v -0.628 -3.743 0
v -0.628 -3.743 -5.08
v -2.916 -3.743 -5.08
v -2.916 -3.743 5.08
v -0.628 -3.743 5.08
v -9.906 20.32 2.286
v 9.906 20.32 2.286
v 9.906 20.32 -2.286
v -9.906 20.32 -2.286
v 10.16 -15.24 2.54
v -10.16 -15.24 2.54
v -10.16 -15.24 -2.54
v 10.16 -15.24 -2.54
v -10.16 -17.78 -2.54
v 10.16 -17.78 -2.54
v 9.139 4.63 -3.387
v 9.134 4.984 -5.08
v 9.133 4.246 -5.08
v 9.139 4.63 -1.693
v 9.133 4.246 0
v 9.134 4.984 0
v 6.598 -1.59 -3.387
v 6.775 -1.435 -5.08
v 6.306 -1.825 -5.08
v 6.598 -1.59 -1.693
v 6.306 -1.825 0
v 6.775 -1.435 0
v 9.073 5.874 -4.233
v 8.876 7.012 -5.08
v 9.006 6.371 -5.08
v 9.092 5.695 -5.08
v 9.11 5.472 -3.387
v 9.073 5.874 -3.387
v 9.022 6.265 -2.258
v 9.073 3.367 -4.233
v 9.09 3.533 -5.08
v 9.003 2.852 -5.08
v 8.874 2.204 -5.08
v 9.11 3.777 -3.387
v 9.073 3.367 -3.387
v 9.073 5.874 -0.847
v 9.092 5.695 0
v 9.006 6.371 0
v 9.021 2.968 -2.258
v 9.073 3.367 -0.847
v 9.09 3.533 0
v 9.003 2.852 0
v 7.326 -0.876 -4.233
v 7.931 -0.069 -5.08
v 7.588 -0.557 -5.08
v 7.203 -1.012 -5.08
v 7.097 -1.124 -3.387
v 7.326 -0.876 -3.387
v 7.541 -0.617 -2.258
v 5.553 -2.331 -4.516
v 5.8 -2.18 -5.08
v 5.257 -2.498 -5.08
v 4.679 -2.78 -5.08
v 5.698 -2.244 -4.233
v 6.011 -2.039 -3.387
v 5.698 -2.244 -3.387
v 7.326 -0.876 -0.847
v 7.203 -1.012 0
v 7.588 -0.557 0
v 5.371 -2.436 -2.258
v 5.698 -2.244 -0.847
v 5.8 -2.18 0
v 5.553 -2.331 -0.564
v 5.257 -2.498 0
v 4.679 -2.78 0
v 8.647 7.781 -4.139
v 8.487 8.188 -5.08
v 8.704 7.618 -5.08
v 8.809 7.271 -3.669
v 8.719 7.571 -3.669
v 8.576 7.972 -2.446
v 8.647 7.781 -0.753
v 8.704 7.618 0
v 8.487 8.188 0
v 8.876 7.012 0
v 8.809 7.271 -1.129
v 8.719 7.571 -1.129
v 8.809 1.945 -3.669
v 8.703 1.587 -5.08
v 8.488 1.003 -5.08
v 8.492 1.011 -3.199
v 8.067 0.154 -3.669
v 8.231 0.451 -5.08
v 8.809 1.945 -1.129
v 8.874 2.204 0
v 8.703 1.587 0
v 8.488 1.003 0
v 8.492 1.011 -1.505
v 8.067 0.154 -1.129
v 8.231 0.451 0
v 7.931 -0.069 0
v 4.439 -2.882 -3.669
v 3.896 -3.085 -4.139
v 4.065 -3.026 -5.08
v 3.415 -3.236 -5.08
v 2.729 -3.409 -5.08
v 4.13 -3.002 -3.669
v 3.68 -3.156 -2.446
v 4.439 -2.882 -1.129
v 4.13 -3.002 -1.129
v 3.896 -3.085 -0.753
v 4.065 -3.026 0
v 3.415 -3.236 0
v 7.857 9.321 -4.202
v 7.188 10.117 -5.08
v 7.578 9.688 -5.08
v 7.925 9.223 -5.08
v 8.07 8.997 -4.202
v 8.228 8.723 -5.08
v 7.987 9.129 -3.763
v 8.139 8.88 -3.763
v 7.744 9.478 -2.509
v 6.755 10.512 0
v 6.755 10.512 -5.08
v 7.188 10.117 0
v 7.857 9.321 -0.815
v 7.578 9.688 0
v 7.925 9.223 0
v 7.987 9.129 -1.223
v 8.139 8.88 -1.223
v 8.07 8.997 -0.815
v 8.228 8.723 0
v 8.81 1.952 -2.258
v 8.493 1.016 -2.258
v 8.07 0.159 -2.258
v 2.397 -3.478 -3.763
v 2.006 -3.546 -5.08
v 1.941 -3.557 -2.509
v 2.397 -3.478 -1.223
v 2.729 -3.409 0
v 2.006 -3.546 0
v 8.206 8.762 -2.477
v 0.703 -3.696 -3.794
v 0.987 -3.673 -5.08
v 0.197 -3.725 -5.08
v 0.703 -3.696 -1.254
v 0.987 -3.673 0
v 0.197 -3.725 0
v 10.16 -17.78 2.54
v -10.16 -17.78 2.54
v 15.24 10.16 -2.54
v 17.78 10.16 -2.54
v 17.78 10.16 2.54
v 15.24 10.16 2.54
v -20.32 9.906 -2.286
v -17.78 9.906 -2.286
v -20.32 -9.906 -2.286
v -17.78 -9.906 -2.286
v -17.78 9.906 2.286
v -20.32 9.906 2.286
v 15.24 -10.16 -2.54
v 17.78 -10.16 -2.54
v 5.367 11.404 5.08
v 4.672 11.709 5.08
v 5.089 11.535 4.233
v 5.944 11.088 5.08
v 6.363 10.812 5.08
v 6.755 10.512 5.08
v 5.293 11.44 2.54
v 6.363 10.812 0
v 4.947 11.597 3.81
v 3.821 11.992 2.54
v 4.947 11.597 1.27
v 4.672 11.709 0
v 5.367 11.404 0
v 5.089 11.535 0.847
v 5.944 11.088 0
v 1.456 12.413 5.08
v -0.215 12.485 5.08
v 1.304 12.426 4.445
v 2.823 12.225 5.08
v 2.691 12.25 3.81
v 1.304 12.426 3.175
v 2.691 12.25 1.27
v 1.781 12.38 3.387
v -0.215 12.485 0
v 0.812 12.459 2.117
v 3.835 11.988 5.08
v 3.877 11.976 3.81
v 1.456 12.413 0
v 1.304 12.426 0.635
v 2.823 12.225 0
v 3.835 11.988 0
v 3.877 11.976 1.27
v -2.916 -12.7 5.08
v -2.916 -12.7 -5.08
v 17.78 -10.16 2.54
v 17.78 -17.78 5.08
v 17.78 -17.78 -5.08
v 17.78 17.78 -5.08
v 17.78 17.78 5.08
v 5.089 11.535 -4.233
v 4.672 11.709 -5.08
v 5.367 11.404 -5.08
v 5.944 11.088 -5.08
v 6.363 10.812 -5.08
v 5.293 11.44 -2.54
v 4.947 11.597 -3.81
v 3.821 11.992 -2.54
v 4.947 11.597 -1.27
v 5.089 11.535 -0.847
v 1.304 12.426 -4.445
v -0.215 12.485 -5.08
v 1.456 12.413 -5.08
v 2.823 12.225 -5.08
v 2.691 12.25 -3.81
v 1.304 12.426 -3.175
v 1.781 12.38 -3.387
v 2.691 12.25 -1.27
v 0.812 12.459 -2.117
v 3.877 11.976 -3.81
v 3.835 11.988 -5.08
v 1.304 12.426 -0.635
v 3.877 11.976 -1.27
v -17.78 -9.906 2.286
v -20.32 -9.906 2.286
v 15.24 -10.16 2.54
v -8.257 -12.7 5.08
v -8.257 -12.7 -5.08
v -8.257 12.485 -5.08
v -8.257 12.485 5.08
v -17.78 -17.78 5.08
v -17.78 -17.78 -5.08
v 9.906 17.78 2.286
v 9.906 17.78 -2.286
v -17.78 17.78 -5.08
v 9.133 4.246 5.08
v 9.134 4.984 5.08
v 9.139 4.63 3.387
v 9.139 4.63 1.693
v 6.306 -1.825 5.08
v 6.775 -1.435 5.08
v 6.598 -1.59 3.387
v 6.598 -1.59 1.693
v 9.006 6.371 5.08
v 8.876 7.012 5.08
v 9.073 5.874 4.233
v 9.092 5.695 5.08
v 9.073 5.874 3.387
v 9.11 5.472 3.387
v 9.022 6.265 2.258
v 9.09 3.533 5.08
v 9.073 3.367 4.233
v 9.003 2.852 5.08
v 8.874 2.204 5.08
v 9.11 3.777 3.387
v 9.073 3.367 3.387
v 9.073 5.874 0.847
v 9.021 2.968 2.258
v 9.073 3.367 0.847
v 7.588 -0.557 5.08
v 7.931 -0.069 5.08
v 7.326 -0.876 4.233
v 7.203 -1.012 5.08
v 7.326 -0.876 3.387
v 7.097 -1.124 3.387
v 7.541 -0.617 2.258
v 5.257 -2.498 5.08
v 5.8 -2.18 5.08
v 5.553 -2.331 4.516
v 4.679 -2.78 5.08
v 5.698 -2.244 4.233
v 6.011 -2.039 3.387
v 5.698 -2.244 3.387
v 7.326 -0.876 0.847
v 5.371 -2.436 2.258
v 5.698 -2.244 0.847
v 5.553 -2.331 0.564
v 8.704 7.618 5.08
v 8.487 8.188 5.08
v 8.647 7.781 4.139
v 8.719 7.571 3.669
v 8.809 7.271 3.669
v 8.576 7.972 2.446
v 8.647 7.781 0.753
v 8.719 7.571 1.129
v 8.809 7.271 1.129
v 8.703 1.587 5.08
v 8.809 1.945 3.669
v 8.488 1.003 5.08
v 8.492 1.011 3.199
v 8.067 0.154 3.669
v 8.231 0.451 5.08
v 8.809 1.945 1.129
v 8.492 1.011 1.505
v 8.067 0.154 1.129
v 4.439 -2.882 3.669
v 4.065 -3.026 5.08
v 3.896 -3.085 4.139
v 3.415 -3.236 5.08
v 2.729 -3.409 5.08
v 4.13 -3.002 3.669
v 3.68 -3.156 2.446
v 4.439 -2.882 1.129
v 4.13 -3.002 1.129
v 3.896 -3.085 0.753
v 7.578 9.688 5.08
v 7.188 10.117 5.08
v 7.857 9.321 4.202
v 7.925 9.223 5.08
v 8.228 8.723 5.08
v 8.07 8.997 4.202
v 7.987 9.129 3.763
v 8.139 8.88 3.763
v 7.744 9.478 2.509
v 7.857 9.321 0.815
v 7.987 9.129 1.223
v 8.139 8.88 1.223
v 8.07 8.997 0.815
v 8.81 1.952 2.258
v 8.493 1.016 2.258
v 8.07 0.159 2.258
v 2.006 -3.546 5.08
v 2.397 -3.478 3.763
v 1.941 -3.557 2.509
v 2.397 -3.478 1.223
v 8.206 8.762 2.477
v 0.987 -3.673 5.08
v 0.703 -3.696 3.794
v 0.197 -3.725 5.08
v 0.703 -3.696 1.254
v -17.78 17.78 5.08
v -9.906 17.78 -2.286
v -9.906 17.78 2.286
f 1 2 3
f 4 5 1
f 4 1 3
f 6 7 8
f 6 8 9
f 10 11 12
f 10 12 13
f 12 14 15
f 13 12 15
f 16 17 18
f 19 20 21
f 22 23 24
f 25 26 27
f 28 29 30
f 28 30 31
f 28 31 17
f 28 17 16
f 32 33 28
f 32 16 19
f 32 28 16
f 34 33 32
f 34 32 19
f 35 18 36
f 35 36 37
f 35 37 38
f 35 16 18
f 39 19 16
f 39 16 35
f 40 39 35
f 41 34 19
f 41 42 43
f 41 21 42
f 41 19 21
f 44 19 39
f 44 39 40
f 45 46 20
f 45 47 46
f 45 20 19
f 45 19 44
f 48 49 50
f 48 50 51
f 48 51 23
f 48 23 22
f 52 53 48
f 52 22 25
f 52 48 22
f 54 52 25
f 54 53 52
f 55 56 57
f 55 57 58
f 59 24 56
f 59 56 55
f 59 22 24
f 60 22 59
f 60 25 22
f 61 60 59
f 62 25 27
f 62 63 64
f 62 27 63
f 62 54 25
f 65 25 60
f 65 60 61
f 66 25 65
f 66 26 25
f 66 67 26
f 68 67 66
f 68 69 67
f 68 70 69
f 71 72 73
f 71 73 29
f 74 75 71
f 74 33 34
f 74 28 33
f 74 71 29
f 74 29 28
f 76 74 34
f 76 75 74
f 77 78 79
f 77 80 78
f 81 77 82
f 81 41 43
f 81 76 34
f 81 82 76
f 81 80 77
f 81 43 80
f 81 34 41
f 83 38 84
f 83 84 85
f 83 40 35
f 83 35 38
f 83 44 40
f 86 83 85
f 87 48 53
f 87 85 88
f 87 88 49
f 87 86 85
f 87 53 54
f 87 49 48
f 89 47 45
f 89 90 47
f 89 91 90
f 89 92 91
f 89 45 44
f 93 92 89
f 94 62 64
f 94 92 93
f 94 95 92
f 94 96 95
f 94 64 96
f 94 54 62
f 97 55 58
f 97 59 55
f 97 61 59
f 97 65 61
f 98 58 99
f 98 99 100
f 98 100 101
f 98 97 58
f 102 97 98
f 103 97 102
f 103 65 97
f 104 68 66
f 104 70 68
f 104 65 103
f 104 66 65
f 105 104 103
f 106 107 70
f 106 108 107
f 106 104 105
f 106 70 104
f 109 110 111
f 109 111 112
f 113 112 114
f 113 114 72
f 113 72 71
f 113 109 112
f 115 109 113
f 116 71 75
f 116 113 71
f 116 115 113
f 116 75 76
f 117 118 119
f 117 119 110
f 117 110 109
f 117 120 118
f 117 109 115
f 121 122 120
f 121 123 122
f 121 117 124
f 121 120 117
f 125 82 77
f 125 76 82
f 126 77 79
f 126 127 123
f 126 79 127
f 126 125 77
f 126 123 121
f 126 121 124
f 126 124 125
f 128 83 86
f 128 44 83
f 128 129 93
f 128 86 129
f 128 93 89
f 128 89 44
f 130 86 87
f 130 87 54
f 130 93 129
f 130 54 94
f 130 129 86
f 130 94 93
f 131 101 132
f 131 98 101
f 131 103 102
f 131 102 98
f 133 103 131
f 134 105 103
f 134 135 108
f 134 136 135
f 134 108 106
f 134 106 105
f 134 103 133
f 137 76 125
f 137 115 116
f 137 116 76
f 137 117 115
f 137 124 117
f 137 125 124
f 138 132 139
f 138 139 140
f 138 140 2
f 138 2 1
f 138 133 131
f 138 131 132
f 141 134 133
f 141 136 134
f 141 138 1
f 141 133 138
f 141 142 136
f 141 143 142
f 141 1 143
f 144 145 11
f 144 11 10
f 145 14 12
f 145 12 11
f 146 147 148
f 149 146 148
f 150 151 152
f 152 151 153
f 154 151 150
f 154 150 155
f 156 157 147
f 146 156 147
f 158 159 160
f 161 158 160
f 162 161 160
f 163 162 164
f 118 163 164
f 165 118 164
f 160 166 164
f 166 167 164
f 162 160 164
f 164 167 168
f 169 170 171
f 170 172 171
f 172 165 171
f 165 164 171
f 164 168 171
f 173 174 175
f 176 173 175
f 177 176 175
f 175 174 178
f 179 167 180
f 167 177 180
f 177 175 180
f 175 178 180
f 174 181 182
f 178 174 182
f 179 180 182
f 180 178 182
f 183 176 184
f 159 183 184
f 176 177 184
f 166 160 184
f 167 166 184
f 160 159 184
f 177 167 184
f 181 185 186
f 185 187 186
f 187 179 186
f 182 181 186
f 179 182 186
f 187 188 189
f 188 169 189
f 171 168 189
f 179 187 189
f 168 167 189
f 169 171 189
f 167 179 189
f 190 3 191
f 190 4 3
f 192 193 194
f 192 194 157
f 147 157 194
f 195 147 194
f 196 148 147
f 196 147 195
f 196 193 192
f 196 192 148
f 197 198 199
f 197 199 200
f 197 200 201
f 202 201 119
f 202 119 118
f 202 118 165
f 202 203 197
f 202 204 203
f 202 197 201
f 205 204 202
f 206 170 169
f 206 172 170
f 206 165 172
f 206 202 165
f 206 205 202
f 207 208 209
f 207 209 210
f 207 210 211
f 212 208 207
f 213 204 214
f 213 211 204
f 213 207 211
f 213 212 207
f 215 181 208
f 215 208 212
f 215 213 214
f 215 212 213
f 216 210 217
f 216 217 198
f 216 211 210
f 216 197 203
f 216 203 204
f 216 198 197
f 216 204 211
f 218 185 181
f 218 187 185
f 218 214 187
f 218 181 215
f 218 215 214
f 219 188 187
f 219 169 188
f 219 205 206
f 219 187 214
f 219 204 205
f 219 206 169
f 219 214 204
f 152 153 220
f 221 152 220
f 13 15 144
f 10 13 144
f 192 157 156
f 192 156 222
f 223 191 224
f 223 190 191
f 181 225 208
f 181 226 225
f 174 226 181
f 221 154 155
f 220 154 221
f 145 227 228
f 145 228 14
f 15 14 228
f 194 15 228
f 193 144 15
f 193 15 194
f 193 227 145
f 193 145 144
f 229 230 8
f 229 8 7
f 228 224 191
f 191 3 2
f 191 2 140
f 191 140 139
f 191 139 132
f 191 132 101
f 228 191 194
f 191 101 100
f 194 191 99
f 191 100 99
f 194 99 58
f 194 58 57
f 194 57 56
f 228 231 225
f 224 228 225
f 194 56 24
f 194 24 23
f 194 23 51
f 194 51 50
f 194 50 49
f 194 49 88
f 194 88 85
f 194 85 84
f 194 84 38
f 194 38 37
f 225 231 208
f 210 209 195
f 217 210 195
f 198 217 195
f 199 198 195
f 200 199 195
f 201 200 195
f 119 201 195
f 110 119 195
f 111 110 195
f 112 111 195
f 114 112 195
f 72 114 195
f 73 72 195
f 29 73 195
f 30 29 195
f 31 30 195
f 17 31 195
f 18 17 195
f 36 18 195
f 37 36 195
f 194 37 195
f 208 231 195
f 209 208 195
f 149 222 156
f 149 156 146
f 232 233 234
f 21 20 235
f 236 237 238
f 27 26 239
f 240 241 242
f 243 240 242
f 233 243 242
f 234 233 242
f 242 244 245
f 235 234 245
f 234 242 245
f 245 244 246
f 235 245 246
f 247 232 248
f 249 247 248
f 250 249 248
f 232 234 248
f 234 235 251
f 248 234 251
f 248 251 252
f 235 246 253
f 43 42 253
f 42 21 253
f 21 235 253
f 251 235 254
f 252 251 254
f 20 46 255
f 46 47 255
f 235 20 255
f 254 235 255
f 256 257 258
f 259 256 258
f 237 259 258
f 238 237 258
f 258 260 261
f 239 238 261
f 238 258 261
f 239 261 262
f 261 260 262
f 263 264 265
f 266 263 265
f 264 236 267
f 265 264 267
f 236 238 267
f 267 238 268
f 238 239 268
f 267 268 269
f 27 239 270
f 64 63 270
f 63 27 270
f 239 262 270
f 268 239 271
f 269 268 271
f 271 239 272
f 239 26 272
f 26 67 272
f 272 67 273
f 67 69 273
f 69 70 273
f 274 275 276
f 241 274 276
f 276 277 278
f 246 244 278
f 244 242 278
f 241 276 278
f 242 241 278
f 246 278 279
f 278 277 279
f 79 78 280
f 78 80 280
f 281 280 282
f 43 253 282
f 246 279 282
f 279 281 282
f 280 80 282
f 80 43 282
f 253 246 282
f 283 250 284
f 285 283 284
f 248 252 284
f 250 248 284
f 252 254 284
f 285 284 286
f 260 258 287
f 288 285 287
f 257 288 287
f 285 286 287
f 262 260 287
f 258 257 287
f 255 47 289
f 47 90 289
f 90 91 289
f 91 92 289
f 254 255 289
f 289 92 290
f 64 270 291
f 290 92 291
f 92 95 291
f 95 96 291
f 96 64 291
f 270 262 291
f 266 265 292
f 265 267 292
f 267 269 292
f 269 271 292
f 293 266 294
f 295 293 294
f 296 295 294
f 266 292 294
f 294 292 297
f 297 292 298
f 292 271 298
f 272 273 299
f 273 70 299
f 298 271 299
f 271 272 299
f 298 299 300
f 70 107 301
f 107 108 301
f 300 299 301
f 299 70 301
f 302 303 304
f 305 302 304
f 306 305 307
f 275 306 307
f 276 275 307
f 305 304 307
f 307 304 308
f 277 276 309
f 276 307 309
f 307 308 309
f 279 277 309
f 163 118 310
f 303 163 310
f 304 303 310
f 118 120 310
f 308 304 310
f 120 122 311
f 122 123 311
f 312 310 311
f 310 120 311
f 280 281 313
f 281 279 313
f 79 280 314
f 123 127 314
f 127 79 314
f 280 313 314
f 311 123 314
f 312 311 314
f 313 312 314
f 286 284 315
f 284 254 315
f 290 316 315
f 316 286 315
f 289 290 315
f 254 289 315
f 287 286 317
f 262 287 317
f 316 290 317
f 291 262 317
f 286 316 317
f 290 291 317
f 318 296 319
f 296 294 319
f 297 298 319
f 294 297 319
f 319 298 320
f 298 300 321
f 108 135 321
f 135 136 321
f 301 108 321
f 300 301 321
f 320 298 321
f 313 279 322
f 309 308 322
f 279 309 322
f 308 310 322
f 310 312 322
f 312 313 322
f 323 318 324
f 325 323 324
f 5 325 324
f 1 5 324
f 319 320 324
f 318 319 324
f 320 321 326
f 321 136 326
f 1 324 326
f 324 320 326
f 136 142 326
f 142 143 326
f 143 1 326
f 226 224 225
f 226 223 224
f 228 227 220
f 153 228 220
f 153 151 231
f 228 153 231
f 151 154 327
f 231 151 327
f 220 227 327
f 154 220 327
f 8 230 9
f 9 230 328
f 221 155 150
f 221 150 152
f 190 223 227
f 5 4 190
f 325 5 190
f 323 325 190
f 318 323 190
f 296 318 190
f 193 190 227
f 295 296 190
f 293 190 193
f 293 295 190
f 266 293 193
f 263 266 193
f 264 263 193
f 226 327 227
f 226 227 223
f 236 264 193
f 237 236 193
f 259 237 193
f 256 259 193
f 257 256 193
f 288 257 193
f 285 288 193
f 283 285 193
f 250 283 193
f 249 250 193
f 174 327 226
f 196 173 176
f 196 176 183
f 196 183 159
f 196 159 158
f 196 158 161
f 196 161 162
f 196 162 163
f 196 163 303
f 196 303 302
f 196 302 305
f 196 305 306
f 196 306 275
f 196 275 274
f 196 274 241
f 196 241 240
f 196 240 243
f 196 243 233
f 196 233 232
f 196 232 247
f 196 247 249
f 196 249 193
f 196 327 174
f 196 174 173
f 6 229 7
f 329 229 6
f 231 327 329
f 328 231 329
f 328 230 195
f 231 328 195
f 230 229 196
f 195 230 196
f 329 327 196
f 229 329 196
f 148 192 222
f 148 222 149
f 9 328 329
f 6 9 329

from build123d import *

# Parameters (mm, degrees)
F0_W     = 35.56
F0_H     = 35.56
F1_DEPTH = 5.08
F2_W     = 19.812
F2_H     = 4.572
F3_DEPTH = 2.54
F4_W     = 19.812
F4_H     = 4.572
F5_DEPTH = 2.54
F6_W     = 20.32
F6_H     = 5.08
F7_DEPTH = 2.54
F8_W     = 20.32
F8_H     = 5.08
F9_DEPTH = 2.54


with BuildPart() as f1:
    # F0 (on Top) → F1 (new body, symmetric)
    with BuildSketch(Plane.XY):
        Rectangle(F0_W, F0_H)
        with BuildLine():
            add(Edge.make_bspline(
                [(6.7551432292, 10.5116753472), (9.1391493056, 8.5383246528), (9.1391493056, 4.6302083333)],
                knots=[0, 0, 0, 1, 1, 1], degree=2))
            add(Edge.make_bspline(
                [(9.1391493056, 4.6302083333), (9.1391493056, 0.5622395833), (6.598046875, -1.5902560764)],
                knots=[0, 0, 0, 1, 1, 1], degree=2))
            add(Edge.make_bspline(
                [(6.598046875, -1.5902560764), (4.0569444444, -3.7427517361), (-0.6283854167, -3.7427517361)],
                knots=[0, 0, 0, 1, 1, 1], degree=2))
            Line((-0.6283854167, -3.7427517361), (-2.9159288194, -3.7427517361))
            Line((-2.9159288194, -3.7427517361), (-2.9159288194, -12.7))
            Line((-2.9159288194, -12.7), (-8.2572048611, -12.7))
            Line((-8.2572048611, -12.7), (-8.2572048611, 12.4850260417))
            Line((-8.2572048611, 12.4850260417), (-0.2149739583, 12.4850260417))
            add(Edge.make_bspline(
                [(-0.2149739583, 12.4850260417), (4.3711371528, 12.4850260417), (6.7551432292, 10.5116753472)],
                knots=[0, 0, 0, 1, 1, 1], degree=2))
        make_face(mode=Mode.SUBTRACT)
    extrude(amount=F1_DEPTH, both=True)

    # F2 (on face) → F3 (join)
    with BuildSketch(Plane(origin=(0, 17.78, 0), x_dir=(-1, 0, 0), z_dir=(0, 1, 0))):
        Rectangle(F2_W, F2_H)
    extrude(amount=F3_DEPTH)

    # F4 (on face) → F5 (join)
    with BuildSketch(Plane(origin=(-17.78, 0, 0), x_dir=(0, -1, 0), z_dir=(-1, 0, 0))):
        Rectangle(F4_W, F4_H)
    extrude(amount=F5_DEPTH)

    # F6 (on face) → F7 (cut)
    with BuildSketch(Plane.XZ.offset(17.78)):
        Rectangle(F6_W, F6_H)
    extrude(amount=-F7_DEPTH, mode=Mode.SUBTRACT)

    # F8 (on face) → F9 (cut)
    with BuildSketch(Plane.YZ.offset(17.78)):
        Rectangle(F8_W, F8_H)
    extrude(amount=-F9_DEPTH, mode=Mode.SUBTRACT)


solid = f1.part
